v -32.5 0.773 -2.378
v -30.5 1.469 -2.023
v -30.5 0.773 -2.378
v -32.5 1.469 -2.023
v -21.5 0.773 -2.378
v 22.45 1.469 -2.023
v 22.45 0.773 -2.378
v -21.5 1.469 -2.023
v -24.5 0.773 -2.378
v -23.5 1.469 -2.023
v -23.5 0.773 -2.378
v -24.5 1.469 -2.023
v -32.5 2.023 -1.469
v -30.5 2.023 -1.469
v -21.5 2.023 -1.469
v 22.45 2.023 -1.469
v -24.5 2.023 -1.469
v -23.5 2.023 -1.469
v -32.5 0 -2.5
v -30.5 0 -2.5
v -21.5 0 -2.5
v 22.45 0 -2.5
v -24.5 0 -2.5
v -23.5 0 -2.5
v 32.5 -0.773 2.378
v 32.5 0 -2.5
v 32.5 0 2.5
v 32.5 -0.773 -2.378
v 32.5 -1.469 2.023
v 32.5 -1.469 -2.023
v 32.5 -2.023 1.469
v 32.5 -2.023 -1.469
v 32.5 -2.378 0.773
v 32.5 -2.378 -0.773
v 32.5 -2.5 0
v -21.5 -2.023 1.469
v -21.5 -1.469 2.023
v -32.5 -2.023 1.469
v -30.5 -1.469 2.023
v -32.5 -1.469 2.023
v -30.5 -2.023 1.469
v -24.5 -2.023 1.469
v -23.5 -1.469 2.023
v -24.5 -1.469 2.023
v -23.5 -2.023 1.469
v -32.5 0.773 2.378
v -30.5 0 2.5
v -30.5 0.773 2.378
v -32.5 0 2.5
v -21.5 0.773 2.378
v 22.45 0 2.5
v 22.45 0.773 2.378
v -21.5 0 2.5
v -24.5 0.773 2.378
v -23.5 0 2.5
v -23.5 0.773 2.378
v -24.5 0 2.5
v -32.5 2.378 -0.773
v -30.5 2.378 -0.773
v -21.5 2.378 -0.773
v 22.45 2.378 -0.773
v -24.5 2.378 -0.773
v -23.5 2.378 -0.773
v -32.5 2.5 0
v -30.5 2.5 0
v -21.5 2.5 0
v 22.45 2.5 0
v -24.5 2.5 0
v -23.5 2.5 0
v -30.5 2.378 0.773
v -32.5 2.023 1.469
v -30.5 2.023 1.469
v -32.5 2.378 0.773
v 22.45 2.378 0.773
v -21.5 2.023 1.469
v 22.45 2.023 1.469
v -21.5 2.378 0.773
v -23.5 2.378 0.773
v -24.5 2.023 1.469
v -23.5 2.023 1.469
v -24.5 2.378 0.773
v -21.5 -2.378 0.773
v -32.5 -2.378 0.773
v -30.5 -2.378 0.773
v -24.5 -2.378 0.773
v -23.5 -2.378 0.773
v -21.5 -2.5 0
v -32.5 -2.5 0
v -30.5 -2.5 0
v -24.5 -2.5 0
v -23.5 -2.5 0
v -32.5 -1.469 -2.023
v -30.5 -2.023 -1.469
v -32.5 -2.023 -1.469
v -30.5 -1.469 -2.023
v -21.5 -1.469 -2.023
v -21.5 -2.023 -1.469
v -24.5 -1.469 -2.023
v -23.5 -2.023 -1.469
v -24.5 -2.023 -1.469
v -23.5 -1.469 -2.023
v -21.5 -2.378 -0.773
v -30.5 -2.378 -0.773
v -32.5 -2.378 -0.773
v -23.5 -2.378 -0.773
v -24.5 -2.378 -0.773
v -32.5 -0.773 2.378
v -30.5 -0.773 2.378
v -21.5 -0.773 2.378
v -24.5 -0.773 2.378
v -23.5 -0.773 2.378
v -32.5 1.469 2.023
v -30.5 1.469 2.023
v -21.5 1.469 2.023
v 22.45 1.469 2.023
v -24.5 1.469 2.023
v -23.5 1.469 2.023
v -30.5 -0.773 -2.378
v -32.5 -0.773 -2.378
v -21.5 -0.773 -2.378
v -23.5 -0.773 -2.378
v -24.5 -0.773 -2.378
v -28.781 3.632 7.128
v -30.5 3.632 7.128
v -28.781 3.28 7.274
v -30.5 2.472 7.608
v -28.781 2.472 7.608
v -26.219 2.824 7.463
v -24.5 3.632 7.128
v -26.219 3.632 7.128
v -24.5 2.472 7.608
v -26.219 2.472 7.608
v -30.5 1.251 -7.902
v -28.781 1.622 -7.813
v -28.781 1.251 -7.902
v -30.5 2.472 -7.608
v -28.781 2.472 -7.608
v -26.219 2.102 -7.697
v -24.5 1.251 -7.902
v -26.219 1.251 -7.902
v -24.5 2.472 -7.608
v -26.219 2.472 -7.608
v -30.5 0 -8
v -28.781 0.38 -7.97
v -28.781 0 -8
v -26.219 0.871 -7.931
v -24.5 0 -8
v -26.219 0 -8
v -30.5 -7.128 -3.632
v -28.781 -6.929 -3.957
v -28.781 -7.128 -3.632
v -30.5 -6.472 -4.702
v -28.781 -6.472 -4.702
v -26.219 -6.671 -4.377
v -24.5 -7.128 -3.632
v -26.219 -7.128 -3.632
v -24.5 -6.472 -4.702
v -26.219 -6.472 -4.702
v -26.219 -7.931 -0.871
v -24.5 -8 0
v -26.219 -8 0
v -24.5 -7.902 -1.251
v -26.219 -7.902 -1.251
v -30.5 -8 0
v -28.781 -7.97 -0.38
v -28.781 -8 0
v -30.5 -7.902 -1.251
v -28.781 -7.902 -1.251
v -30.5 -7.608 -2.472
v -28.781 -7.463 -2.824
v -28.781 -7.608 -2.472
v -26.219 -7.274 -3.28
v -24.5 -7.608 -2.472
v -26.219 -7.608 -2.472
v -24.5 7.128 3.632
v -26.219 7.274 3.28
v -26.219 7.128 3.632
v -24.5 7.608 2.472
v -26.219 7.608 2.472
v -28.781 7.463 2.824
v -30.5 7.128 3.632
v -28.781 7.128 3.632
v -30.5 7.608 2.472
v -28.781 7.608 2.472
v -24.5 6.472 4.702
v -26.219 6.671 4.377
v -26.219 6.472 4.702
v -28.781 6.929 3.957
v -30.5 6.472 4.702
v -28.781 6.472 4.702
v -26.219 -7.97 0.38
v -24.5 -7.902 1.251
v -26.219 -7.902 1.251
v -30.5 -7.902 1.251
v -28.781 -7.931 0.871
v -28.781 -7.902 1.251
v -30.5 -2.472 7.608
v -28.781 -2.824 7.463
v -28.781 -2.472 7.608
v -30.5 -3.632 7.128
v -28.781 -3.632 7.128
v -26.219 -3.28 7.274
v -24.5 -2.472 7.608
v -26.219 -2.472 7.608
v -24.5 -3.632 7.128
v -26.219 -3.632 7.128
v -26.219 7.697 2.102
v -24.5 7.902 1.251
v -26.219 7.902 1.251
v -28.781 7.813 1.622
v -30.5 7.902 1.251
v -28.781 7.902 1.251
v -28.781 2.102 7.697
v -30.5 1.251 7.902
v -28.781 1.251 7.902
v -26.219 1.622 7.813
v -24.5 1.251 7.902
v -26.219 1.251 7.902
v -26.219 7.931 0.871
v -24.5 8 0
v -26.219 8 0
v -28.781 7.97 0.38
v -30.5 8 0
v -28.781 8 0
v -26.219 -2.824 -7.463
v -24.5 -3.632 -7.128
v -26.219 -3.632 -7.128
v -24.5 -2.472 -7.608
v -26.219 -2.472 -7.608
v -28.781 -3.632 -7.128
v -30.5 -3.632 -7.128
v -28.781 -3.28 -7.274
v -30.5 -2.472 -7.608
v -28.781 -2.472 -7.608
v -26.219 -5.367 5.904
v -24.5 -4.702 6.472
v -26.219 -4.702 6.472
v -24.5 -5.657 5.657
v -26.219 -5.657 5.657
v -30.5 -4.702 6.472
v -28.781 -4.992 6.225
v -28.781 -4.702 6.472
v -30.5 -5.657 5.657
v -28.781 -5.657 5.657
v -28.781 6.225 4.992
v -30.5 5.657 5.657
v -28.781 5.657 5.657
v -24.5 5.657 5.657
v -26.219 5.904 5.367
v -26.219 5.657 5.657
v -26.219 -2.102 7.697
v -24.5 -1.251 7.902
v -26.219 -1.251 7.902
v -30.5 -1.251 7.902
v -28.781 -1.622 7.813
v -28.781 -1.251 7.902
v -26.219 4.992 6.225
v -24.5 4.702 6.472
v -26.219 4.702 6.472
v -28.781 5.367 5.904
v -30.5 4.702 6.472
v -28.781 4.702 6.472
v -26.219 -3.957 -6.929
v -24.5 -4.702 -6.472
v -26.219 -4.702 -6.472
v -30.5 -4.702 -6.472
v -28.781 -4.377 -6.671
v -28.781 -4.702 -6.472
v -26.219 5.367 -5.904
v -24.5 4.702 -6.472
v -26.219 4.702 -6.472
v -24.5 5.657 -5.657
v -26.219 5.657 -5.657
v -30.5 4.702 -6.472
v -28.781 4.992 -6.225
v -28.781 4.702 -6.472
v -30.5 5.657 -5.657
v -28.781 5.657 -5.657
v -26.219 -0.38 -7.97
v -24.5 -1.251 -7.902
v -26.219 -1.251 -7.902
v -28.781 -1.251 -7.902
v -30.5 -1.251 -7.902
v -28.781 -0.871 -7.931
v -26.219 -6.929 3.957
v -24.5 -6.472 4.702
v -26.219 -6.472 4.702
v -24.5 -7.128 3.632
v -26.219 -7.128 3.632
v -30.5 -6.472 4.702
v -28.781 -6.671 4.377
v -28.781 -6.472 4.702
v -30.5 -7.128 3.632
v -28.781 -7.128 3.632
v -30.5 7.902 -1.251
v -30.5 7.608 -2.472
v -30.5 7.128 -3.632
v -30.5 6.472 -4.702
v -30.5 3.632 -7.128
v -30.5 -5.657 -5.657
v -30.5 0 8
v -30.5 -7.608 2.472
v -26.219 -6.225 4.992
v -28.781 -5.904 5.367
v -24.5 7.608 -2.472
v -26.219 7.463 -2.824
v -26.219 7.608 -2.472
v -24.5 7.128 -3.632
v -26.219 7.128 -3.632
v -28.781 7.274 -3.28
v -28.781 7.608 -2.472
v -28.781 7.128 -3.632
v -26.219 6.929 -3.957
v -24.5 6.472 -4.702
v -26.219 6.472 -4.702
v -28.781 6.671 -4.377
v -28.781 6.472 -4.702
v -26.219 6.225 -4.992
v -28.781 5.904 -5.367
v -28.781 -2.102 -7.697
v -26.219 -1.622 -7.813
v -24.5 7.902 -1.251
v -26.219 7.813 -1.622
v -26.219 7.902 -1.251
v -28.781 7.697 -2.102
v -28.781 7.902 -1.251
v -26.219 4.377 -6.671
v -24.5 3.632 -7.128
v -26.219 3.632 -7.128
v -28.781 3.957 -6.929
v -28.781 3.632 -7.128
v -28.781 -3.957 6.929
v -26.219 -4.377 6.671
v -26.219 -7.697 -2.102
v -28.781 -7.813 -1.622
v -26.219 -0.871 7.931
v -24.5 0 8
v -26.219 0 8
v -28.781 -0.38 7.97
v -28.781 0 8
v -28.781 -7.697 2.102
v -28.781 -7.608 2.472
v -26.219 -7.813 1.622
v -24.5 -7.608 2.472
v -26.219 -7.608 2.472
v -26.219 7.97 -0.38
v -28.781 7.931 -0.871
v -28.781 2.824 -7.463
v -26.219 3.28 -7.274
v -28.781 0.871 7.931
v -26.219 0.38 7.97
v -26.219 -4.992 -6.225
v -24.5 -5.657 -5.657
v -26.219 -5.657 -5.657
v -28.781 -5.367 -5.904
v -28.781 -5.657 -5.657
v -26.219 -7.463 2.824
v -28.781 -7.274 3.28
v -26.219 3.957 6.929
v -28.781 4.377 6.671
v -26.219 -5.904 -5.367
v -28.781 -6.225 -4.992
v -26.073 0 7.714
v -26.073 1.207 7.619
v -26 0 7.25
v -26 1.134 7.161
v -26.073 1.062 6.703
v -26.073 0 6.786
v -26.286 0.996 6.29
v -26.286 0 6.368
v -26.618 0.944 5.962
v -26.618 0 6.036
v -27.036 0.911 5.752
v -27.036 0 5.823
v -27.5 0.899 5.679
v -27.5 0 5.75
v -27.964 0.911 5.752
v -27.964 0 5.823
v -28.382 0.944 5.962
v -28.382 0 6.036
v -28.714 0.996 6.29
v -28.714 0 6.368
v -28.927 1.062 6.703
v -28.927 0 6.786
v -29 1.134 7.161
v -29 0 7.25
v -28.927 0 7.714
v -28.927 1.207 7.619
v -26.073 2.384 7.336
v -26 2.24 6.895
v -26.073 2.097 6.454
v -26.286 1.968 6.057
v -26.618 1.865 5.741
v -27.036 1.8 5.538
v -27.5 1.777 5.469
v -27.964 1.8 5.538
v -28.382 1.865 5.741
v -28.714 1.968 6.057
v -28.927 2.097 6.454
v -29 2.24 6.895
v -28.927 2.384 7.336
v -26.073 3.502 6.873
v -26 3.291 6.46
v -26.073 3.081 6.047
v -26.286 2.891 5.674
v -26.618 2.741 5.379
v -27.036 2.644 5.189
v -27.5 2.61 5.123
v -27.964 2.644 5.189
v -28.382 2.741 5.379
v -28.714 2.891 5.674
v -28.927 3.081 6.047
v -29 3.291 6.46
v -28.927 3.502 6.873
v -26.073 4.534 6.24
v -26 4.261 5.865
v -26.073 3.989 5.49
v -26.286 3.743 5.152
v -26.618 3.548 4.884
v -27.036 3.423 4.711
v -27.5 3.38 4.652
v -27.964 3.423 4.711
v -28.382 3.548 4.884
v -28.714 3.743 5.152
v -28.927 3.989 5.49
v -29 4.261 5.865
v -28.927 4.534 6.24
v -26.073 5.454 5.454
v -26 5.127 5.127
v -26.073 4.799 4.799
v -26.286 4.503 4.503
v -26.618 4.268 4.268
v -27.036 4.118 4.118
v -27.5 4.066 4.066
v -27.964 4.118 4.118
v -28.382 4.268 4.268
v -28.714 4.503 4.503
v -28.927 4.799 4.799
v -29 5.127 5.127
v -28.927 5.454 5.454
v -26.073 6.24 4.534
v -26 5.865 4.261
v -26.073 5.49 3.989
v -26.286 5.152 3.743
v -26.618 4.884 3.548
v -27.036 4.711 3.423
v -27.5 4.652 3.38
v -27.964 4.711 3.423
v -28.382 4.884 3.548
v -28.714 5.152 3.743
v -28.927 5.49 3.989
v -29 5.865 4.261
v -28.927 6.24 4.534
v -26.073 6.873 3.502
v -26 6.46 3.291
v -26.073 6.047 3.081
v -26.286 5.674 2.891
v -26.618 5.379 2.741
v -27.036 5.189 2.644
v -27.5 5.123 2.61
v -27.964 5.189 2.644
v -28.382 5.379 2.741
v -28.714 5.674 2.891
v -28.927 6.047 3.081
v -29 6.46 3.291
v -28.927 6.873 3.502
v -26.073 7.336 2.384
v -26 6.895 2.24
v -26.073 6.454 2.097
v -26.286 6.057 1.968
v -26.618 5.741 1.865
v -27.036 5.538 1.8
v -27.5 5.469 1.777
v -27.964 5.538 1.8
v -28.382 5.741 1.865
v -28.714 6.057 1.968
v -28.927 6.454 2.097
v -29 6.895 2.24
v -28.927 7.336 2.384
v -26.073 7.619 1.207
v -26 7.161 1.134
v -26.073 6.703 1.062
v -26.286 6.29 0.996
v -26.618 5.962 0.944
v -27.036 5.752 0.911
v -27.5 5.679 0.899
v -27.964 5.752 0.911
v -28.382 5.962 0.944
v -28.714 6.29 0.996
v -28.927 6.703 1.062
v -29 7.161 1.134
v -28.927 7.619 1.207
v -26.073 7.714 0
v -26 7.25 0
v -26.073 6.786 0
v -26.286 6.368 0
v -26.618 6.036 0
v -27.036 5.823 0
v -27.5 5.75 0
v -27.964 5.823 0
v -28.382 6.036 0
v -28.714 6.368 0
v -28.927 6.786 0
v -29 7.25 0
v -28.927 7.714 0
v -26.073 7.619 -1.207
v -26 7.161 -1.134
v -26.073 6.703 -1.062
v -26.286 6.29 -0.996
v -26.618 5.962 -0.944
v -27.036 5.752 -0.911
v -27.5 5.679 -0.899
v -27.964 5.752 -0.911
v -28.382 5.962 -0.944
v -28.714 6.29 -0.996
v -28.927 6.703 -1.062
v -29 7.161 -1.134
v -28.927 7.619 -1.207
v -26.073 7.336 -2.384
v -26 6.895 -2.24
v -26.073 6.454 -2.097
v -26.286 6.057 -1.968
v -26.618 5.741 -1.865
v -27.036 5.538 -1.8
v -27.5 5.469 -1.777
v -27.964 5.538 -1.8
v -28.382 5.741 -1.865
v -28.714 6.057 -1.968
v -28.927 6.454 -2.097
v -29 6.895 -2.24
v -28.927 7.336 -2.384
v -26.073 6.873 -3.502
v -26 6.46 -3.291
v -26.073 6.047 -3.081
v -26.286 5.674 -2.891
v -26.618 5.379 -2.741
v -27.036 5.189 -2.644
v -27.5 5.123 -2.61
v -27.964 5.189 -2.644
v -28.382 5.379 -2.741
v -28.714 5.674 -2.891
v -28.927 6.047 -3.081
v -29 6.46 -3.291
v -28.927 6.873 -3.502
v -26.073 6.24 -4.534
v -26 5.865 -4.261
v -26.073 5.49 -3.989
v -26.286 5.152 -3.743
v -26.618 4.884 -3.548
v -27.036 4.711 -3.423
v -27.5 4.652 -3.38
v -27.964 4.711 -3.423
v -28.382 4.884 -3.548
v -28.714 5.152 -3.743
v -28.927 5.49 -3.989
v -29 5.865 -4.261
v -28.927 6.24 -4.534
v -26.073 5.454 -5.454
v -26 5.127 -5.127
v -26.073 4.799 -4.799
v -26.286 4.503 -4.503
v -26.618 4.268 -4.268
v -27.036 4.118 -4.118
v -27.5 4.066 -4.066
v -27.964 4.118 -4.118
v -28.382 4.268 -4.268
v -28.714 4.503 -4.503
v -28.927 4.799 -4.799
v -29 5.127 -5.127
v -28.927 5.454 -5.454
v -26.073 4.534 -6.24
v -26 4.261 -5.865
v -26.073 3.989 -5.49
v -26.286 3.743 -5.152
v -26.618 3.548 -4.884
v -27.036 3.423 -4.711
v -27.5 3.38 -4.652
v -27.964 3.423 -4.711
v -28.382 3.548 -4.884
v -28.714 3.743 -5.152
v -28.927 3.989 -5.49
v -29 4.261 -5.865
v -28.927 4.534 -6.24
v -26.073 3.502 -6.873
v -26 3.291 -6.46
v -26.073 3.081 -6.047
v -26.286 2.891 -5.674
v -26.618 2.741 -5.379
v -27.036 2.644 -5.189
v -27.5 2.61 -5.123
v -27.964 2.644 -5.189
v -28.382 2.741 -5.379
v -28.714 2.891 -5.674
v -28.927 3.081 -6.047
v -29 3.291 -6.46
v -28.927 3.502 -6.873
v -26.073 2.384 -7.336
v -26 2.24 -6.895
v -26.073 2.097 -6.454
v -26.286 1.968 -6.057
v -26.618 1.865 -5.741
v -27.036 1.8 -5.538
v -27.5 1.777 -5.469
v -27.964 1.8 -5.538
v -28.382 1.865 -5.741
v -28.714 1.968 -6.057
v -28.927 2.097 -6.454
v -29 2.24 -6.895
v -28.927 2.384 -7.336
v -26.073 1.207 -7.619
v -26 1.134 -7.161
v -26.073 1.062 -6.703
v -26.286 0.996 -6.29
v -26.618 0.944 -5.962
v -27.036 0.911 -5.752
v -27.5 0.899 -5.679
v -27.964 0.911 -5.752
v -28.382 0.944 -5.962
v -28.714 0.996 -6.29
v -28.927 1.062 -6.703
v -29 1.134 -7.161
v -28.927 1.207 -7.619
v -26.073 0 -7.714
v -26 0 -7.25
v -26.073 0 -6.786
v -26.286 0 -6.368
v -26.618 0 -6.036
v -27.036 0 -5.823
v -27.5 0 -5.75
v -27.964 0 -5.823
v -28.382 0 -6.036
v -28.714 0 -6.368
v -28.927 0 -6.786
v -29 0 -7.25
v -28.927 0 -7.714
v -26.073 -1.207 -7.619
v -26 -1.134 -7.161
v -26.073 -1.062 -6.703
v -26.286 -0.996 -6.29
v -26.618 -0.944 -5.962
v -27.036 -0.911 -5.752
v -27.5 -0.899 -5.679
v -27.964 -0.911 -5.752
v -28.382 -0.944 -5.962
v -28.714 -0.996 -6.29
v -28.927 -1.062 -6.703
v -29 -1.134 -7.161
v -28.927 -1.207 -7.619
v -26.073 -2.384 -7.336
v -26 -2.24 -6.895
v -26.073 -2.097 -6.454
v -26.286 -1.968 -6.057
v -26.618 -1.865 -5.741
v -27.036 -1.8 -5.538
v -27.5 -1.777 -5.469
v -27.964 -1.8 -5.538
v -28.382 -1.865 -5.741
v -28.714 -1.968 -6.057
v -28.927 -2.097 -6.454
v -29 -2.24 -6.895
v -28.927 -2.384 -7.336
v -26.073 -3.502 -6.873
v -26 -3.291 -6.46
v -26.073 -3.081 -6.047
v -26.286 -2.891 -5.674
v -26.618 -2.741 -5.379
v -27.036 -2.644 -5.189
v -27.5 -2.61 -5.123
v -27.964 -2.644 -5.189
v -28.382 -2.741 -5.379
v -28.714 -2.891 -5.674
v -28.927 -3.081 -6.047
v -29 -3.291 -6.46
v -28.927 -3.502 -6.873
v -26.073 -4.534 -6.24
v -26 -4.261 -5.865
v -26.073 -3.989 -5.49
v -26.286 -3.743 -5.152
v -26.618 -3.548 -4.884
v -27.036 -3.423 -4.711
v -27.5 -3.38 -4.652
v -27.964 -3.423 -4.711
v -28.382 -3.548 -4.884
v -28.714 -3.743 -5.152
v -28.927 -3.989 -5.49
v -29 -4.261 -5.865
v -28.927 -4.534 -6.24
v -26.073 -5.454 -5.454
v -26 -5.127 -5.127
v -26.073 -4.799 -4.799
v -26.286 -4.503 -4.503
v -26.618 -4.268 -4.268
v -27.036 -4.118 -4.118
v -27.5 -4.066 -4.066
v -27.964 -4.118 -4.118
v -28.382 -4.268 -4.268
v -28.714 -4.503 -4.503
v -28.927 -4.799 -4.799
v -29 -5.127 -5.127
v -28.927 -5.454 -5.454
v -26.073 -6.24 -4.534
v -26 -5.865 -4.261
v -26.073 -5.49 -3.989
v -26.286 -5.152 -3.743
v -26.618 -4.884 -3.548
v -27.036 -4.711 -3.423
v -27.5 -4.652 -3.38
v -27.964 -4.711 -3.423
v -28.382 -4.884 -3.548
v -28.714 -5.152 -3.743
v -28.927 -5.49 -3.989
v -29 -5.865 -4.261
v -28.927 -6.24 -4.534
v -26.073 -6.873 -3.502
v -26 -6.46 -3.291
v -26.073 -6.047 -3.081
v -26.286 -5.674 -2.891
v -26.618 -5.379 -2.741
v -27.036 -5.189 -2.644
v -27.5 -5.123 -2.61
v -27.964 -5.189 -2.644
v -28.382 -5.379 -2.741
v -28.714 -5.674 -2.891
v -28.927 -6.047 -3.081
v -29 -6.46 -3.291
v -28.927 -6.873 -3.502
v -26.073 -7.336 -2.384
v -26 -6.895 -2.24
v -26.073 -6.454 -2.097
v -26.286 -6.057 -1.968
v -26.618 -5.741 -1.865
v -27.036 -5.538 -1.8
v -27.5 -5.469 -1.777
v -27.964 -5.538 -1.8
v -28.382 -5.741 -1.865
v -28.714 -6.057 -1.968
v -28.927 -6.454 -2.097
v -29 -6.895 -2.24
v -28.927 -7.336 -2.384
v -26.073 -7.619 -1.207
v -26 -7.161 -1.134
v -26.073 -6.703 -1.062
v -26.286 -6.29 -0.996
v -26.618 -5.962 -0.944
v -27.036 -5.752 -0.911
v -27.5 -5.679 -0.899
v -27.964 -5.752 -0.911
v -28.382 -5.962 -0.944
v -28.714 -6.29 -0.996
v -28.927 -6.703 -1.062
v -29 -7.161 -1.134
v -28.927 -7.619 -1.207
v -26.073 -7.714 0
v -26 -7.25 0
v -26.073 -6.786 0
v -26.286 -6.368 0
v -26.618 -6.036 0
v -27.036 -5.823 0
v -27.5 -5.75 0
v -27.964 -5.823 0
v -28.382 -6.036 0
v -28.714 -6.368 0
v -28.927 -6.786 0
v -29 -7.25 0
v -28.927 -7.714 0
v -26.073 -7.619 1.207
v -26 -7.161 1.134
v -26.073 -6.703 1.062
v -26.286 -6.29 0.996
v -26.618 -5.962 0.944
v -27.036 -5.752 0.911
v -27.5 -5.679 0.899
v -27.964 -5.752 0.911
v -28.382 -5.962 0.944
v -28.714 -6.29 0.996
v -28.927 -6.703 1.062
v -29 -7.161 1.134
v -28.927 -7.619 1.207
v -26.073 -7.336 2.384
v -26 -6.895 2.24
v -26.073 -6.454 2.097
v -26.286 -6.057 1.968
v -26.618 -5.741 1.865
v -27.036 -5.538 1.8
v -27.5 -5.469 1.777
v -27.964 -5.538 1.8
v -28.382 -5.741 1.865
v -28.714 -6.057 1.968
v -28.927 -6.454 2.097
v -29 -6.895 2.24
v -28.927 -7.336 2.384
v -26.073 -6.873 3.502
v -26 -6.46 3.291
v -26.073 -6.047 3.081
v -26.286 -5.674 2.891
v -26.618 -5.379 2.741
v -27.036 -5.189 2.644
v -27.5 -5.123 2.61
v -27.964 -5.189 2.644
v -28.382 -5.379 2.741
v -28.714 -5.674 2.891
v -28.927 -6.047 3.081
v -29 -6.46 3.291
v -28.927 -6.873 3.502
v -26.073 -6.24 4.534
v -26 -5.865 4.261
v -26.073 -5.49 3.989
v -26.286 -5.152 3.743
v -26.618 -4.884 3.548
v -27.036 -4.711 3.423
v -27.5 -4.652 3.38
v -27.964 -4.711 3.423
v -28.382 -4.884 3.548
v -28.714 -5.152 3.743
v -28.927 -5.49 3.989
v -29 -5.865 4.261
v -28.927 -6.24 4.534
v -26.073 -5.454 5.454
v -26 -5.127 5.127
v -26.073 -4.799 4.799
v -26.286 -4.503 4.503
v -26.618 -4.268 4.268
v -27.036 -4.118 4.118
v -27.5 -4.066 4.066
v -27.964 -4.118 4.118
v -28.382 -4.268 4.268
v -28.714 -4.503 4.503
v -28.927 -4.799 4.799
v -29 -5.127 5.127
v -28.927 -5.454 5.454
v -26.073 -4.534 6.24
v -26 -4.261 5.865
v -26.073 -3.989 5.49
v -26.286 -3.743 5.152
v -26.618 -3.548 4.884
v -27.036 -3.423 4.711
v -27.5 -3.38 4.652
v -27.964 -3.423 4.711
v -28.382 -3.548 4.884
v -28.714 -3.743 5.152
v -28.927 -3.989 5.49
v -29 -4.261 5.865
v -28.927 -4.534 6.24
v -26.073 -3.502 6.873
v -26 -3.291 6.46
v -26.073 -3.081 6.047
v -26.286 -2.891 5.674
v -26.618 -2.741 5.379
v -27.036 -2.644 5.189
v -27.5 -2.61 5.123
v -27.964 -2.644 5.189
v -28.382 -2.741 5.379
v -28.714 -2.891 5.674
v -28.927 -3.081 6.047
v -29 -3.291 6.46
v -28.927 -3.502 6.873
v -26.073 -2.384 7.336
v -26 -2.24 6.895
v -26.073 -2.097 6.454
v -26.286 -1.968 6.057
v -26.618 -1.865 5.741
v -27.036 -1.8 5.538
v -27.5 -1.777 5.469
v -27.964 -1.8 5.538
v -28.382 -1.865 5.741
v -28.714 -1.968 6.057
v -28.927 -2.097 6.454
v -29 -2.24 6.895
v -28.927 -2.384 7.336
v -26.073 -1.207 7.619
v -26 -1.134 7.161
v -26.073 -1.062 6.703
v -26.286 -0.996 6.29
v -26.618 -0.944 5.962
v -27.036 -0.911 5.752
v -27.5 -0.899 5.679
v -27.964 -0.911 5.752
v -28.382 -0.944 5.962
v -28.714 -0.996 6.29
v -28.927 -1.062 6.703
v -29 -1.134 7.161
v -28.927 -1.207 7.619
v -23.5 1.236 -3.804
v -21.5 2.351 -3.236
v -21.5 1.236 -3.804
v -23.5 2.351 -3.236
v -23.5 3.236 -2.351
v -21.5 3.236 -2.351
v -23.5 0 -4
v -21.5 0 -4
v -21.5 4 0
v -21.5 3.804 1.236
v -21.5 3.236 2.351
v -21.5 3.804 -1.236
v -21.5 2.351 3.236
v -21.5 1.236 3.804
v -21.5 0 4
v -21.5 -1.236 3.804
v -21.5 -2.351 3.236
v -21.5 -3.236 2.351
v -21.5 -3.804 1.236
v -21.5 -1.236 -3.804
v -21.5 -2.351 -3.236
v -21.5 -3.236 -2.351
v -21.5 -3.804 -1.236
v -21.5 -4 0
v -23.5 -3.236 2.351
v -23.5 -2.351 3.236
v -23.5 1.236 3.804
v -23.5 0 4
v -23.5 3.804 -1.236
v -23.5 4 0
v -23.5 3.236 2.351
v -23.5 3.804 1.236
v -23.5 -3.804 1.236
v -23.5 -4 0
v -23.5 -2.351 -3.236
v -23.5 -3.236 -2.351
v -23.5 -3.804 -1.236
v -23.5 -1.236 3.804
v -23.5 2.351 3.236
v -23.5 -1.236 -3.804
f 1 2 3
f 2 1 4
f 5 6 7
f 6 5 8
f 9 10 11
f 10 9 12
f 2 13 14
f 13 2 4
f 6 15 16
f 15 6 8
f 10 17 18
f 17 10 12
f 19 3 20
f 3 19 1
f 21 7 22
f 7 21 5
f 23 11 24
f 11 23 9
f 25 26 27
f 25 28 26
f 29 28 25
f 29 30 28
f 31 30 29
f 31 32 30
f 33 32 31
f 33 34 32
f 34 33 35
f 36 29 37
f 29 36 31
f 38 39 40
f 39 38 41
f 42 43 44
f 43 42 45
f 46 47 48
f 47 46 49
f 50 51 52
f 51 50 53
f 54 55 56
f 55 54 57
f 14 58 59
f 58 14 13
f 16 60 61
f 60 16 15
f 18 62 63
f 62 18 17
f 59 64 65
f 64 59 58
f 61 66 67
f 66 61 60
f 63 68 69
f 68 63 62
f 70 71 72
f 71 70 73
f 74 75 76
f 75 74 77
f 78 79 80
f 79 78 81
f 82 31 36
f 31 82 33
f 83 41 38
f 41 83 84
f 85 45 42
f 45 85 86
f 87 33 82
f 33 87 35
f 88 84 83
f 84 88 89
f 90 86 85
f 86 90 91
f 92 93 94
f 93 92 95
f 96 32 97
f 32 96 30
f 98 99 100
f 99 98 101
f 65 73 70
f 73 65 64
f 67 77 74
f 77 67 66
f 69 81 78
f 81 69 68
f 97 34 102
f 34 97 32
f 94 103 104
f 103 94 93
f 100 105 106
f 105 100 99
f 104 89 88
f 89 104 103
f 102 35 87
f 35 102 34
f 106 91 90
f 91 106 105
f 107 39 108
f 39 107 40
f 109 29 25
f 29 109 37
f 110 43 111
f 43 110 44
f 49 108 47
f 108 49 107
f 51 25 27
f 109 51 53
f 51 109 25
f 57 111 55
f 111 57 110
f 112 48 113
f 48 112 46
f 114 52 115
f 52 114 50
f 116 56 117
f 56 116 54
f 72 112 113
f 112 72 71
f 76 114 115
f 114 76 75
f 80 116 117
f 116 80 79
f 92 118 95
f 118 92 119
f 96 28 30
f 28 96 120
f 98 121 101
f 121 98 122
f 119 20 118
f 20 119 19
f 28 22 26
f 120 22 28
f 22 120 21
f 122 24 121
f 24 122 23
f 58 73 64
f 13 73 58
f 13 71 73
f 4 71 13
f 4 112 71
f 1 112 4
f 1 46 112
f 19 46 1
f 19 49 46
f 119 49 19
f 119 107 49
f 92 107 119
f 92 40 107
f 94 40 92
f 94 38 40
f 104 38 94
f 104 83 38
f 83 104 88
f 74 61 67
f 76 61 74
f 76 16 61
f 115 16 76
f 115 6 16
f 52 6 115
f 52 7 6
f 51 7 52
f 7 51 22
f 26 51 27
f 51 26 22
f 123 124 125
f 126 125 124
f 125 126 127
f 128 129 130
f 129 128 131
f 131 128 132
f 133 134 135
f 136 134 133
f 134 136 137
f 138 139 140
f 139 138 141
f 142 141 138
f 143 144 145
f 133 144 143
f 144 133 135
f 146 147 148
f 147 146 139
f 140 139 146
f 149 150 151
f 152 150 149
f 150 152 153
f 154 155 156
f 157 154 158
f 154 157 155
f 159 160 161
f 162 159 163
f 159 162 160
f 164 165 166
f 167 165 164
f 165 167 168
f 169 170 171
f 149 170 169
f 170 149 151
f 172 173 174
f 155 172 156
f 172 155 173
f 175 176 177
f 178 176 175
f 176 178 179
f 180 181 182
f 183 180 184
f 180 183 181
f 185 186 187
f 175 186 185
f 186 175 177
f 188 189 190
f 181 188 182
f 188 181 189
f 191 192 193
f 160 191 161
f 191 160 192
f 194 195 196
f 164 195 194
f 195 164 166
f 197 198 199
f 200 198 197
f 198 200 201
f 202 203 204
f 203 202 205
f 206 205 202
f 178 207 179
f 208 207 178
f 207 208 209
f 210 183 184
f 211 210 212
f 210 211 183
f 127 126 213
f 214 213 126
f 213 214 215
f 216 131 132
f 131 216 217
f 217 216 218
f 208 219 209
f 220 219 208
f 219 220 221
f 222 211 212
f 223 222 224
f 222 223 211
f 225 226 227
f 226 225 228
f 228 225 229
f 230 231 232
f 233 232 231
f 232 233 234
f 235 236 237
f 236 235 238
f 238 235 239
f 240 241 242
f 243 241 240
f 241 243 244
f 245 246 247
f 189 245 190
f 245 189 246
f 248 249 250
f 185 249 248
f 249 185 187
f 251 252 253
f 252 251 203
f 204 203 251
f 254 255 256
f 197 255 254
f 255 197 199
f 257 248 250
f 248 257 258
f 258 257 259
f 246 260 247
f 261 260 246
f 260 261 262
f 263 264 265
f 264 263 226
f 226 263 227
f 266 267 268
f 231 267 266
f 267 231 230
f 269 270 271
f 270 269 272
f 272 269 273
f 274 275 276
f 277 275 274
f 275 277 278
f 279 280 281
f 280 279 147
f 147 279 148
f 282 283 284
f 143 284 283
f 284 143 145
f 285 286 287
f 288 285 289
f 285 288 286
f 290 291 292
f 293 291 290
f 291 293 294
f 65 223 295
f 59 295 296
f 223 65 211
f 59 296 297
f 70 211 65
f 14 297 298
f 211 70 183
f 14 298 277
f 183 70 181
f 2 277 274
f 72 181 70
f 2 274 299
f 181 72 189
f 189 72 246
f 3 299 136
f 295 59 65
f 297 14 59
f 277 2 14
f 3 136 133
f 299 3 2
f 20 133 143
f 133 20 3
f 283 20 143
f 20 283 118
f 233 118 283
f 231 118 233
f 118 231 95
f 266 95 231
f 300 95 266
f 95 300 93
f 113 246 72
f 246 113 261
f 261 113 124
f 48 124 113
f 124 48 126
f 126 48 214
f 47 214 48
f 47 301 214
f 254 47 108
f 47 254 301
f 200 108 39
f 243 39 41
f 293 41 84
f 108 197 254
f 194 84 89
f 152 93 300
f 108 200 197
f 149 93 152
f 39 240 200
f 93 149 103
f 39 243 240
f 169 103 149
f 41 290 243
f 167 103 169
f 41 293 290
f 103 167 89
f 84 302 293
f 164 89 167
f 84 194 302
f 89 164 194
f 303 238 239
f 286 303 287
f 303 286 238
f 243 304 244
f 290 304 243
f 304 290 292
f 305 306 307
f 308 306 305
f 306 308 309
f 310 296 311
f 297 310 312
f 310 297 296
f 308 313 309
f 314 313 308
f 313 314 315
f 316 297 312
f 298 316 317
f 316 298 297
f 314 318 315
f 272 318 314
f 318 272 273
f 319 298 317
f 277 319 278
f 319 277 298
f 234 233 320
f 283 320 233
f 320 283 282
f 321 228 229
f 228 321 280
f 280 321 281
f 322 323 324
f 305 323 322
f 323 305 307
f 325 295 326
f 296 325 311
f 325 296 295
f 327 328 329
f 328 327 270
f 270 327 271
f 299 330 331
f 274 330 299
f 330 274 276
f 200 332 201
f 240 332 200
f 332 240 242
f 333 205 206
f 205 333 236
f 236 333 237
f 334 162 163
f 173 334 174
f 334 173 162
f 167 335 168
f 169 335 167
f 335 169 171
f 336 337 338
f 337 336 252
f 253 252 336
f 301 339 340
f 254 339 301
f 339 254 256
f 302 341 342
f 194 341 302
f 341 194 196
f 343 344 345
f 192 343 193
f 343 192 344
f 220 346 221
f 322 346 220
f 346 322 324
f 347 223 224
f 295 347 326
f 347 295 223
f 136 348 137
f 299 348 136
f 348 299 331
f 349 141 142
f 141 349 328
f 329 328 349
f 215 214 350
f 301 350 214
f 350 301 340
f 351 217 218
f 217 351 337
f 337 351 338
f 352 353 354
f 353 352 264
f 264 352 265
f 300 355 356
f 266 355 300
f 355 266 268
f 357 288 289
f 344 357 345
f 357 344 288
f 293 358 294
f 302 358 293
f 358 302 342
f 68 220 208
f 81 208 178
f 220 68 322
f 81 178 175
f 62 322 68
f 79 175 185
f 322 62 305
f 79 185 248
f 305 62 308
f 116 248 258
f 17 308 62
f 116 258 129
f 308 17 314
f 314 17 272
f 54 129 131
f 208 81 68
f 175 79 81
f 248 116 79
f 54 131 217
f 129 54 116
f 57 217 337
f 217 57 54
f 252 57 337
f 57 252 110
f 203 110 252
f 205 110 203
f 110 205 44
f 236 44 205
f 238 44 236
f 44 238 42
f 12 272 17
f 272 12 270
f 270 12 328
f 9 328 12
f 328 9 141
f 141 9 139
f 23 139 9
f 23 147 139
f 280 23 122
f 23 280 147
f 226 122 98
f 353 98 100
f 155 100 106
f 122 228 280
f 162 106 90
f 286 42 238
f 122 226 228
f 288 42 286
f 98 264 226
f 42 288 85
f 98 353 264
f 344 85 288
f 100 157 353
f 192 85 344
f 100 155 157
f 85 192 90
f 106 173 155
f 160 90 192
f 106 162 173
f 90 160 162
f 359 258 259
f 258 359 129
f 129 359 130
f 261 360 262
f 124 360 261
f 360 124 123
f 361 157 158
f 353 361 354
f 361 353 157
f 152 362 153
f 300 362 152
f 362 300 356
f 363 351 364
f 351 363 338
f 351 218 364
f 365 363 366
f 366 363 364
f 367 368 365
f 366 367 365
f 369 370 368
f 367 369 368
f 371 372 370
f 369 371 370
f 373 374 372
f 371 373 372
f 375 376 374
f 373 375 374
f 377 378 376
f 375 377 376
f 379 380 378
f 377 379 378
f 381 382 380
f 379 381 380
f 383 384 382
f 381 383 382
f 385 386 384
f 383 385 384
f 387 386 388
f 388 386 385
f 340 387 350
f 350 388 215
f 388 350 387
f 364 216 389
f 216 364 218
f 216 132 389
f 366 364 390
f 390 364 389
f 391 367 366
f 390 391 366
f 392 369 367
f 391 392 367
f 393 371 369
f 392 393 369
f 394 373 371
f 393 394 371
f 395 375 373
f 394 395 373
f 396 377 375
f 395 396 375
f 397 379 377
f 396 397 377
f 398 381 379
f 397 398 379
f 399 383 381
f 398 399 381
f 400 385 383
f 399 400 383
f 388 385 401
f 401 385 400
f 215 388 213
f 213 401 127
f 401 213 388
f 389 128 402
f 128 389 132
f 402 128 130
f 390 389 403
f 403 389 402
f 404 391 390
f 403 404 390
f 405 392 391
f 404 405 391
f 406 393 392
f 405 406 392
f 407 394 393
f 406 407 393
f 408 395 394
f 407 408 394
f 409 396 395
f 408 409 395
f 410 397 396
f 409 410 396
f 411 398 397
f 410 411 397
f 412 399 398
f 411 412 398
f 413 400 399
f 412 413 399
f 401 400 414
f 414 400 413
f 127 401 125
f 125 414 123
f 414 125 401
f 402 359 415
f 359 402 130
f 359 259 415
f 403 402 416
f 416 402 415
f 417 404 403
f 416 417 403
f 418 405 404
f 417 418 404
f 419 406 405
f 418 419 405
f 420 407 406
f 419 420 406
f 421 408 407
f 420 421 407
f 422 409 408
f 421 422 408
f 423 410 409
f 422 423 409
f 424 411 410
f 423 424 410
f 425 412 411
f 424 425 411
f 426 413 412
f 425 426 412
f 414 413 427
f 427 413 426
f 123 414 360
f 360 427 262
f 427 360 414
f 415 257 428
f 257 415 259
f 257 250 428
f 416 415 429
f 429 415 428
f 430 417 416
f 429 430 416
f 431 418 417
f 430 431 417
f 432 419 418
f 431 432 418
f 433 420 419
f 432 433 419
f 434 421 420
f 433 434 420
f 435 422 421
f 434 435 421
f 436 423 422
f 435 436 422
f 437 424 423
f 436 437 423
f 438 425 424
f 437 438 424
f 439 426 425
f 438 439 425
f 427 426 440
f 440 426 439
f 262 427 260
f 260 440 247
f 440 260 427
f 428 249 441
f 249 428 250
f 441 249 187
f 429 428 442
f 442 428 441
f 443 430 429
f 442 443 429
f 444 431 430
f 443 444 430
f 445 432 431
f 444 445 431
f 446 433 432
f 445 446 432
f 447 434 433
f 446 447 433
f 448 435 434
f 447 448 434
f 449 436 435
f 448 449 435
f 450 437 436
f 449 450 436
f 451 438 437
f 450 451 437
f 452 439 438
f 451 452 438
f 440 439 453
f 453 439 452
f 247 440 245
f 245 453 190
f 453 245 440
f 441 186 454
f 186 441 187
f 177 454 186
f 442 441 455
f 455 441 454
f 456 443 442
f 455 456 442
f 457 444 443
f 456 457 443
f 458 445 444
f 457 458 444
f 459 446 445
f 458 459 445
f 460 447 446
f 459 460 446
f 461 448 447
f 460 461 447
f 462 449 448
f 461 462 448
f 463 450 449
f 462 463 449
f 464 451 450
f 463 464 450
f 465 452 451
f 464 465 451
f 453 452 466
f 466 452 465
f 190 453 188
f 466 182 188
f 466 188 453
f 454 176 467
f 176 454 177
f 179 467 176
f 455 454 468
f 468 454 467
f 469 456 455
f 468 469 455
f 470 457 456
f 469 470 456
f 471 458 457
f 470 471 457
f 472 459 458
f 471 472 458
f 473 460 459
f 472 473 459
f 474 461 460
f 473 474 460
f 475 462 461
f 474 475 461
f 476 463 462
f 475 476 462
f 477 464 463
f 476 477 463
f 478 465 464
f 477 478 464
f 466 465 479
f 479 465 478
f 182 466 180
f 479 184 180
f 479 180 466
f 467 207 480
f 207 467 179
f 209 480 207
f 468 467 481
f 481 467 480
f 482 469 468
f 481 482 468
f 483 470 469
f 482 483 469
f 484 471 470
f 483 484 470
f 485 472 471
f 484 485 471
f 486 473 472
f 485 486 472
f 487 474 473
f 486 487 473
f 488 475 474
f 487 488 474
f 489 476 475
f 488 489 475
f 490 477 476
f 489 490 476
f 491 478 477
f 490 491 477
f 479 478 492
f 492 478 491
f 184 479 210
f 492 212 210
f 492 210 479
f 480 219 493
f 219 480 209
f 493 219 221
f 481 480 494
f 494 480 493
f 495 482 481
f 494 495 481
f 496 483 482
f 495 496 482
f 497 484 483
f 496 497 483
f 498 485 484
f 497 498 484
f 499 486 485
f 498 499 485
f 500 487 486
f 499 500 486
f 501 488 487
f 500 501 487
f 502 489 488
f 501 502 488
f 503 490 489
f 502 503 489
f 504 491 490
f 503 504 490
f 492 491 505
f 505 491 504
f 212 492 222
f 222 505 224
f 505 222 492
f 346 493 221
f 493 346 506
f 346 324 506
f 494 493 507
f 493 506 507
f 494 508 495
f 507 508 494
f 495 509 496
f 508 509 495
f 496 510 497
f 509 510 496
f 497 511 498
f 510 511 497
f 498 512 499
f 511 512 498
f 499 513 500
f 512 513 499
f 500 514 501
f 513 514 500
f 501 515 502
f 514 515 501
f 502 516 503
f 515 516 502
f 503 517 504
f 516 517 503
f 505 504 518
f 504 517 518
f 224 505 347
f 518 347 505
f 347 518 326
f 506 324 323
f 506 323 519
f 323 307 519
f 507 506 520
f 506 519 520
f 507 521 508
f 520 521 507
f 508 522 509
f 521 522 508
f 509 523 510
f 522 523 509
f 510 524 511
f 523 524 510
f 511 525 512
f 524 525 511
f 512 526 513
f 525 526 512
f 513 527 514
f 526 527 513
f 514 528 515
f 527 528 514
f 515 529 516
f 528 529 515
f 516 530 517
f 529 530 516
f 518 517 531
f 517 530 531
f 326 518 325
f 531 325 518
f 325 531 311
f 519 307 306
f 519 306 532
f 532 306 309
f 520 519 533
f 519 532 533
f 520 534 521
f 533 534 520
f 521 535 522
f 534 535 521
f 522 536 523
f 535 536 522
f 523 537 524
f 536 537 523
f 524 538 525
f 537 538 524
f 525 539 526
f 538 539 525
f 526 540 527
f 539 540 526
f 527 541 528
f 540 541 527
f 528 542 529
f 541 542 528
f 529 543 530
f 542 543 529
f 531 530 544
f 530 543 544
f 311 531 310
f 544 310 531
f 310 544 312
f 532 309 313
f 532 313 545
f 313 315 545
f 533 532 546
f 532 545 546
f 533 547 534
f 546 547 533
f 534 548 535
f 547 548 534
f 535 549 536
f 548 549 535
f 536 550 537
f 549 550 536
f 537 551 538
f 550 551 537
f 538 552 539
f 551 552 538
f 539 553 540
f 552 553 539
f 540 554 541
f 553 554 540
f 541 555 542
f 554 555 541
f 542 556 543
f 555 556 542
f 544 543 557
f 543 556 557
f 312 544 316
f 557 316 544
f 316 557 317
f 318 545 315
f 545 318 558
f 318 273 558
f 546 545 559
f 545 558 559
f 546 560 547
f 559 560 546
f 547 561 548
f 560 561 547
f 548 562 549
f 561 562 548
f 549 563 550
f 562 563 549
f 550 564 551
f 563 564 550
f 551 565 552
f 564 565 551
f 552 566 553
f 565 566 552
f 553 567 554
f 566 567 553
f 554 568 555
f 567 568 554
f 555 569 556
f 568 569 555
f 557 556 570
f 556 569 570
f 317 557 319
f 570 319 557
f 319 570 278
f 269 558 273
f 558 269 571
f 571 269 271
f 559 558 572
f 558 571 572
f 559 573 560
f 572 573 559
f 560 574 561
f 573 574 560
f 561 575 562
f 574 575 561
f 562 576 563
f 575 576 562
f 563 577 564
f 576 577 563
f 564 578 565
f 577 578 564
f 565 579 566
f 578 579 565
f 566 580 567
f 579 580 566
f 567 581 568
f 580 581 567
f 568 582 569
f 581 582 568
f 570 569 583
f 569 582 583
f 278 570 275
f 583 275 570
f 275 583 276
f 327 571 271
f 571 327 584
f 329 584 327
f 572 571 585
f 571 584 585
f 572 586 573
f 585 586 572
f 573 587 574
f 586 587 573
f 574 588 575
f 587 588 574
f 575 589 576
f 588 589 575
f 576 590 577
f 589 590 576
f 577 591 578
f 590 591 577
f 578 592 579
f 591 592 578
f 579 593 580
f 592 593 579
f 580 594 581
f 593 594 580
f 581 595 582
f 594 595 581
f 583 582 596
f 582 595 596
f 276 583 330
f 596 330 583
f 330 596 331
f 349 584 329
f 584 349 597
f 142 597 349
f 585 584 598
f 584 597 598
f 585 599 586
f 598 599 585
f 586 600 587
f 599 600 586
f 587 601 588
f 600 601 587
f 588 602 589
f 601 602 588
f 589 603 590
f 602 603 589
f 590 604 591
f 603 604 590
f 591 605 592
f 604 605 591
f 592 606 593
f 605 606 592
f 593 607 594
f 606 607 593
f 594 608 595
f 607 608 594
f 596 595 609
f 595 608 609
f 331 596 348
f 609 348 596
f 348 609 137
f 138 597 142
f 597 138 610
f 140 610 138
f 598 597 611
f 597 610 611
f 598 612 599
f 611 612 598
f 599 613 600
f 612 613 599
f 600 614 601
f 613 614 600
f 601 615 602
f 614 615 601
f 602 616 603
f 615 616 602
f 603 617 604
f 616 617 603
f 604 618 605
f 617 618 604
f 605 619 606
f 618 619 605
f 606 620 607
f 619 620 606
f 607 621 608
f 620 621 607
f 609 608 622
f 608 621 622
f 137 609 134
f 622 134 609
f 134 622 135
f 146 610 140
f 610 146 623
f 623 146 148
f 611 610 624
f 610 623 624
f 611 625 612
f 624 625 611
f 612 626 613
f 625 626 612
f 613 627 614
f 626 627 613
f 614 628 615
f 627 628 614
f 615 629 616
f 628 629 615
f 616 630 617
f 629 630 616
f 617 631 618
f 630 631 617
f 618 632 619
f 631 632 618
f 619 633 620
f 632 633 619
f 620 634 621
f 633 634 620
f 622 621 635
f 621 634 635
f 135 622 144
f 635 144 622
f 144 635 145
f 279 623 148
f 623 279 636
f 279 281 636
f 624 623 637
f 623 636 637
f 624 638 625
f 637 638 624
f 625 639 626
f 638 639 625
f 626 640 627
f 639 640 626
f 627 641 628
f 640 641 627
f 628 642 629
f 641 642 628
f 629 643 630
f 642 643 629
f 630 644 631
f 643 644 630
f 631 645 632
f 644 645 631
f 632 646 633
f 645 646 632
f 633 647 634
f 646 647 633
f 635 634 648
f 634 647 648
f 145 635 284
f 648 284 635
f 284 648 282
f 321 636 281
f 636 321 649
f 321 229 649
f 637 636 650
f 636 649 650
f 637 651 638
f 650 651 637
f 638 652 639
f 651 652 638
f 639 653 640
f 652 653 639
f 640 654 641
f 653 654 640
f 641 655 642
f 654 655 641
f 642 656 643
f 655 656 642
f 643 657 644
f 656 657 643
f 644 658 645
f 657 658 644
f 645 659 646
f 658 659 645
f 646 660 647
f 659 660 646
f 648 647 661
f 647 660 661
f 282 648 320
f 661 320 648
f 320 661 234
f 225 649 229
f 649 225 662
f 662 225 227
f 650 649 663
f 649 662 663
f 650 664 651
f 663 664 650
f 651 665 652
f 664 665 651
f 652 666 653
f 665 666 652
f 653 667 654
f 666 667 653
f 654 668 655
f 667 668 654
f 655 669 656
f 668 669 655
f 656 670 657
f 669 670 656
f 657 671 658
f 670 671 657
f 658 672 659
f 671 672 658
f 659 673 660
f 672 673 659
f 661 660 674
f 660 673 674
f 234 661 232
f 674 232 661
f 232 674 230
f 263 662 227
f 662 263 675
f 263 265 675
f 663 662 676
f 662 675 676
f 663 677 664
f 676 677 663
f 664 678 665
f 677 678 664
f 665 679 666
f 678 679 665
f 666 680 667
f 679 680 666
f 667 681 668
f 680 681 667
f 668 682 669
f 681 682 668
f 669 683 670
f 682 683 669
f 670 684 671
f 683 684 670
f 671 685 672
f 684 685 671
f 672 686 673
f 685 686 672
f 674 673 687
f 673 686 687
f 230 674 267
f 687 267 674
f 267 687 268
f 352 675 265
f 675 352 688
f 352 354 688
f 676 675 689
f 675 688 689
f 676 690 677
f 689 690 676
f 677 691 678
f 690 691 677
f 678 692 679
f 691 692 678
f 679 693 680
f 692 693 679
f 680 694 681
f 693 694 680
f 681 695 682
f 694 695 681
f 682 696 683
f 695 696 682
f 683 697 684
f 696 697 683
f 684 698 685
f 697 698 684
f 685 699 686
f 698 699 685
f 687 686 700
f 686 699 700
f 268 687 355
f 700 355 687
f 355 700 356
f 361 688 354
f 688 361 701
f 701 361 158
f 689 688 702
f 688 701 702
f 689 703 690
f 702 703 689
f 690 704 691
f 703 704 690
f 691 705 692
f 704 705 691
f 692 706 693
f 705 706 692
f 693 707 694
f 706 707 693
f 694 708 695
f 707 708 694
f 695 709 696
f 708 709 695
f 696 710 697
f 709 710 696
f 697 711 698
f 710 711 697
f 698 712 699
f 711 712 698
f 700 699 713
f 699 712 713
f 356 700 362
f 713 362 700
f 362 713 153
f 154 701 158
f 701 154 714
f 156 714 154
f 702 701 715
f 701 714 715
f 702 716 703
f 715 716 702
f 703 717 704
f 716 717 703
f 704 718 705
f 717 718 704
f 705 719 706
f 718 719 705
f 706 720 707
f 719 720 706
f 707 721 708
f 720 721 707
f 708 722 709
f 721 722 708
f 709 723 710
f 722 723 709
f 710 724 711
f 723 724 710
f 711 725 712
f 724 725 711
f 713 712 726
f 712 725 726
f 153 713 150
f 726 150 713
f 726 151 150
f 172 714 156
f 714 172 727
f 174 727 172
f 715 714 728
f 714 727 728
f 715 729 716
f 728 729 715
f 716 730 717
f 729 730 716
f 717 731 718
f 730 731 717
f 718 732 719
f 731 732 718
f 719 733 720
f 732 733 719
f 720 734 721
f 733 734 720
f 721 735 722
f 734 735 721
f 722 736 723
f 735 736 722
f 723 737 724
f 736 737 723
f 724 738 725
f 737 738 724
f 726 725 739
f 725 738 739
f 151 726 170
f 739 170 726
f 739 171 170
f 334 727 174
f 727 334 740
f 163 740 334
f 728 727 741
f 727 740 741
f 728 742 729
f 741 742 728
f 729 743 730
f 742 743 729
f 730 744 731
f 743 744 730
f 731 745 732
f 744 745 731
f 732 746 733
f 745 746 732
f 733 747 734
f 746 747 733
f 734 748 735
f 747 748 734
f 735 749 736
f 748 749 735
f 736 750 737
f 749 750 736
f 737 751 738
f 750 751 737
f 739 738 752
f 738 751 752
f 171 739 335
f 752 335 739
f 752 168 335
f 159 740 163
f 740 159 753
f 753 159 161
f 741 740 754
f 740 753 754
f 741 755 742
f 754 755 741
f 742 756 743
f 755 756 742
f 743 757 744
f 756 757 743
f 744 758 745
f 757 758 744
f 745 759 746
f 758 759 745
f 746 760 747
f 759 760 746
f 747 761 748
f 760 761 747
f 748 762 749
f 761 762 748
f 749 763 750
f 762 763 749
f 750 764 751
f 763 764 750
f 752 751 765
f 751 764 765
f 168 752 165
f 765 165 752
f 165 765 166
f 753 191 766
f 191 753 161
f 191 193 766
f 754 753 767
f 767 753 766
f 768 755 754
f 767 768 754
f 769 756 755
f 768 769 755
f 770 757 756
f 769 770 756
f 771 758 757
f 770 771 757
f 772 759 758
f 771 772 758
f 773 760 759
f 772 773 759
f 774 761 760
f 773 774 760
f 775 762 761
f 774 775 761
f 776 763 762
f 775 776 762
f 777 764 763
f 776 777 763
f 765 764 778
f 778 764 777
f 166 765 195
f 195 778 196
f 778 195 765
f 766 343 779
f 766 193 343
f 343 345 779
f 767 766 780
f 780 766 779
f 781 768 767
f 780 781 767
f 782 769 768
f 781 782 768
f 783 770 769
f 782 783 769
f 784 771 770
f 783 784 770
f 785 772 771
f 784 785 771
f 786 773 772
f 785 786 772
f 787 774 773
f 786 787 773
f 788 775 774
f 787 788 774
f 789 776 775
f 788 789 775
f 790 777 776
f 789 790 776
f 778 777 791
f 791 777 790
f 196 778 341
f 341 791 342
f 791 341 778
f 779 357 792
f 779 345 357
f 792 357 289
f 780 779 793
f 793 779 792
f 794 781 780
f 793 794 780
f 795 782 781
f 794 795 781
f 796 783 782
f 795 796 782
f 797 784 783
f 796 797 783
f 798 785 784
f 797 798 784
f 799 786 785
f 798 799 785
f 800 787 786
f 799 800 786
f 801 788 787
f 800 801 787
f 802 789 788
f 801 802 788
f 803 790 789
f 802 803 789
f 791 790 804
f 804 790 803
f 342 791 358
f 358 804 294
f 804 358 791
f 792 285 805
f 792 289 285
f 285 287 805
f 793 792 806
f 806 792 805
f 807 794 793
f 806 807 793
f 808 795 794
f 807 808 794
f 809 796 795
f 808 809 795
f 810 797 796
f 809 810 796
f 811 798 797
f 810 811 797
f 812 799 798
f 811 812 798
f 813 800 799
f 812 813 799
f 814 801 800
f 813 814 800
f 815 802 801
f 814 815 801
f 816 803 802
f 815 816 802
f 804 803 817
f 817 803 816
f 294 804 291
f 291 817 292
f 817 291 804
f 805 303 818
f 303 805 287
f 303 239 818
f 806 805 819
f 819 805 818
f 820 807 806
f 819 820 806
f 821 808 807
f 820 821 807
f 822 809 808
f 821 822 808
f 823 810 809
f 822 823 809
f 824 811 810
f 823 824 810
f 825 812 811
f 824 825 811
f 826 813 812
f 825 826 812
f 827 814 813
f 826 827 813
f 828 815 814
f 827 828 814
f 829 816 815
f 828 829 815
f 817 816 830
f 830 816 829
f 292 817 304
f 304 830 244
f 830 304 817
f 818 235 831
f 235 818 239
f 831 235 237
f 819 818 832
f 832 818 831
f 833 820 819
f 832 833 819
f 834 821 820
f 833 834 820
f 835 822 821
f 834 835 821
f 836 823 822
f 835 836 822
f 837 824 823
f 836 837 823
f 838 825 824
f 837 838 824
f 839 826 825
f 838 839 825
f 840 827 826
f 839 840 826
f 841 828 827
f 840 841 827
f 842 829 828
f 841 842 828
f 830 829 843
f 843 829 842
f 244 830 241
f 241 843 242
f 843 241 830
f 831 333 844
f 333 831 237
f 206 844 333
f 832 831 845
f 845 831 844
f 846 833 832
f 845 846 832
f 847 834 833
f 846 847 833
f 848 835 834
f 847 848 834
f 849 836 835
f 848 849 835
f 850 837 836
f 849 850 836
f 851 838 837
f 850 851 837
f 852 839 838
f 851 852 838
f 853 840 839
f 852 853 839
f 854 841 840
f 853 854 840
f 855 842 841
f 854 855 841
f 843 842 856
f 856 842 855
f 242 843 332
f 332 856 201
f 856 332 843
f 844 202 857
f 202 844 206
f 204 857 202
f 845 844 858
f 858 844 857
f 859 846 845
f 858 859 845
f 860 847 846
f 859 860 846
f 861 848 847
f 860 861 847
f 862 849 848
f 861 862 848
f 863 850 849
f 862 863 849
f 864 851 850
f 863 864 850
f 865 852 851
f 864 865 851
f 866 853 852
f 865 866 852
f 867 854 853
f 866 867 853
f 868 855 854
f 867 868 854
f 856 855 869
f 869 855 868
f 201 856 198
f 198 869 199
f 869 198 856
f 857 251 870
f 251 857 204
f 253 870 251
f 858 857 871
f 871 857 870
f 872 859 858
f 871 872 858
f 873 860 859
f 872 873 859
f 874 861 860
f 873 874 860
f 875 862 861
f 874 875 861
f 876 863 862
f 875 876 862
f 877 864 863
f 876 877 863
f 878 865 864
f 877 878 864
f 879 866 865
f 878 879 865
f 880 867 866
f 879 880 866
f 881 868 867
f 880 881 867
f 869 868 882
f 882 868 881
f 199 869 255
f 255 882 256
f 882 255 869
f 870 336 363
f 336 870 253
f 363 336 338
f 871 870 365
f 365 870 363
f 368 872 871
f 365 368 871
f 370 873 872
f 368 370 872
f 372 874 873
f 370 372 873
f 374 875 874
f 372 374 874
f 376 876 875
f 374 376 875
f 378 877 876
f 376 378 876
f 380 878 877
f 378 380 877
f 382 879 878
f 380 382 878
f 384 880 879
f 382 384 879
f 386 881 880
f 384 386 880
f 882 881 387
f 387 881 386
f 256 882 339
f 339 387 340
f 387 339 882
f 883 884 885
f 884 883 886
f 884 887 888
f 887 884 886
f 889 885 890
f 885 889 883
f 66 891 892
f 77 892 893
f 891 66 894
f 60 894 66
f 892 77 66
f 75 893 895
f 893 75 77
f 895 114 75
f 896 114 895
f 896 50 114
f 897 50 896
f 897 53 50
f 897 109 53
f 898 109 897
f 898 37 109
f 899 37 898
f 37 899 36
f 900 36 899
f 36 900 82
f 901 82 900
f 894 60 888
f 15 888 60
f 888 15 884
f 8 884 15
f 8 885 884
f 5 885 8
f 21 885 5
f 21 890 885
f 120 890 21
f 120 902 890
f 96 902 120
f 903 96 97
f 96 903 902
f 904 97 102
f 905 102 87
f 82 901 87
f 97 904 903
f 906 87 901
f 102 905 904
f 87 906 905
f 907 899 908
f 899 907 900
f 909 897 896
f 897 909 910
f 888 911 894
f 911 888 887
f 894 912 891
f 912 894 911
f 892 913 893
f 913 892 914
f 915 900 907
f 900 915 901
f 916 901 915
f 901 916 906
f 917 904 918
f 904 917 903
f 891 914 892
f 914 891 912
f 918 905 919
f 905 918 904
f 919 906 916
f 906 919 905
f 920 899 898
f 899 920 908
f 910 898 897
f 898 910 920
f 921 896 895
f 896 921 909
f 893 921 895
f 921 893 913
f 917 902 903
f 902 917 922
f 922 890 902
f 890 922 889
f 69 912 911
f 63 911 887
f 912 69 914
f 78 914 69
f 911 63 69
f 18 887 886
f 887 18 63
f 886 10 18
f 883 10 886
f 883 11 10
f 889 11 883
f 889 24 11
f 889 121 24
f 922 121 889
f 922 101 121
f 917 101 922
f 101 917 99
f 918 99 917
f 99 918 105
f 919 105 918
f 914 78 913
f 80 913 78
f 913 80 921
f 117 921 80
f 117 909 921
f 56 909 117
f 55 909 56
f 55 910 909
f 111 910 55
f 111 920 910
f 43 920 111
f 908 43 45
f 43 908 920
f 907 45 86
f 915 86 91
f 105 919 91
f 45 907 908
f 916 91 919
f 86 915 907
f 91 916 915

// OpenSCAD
// file: fan.scad
// Steam Engine Fan - Three Piece Design
// Piece 1: Base with U-cradle bearings (prints flat, no supports)
// Piece 2: Axle with pulley only (prints on side, minimal supports)
// Piece 3: Fan disc with D-hole hub (prints flat, no supports)

// === Parameters ===
fan_blades = 6;
fan_radius = 25;
fan_hub_radius = 6;
fan_blade_width = 8;
fan_blade_thickness = 2;
fan_blade_angle = 25;

pulley_radius = 8;
pulley_width = 6;
pulley_groove_depth = 1.5;

axle_radius = 2.5;
axle_length = 65;
d_flat_depth = 1;  // how much to cut for D-shape

base_length = 50;
base_width = 30;
base_height = 3;
base_screw_hole_radius = 1.5;
base_screw_inset = 5;

bearing_height = 35;
bearing_wall = 3;
bearing_width = 8;
clearance = 0.15;  // tight fit for open slot

// === D-shape profiles ===
module d_shaft(length) {
    // Axle with a flat cut on one side
    difference() {
        rotate([0, 90, 0])
            cylinder(h=length, r=axle_radius, center=true, $fn=20);
        // Cut flat
        translate([0, axle_radius - d_flat_depth + axle_radius, 0])
            cube([length + 1, axle_radius * 2, axle_radius * 2], center=true);
    }
}

module d_hole(depth) {
    // Matching D-shaped hole with clearance
    hole_r = axle_radius + 0.2;
    difference() {
        rotate([0, 90, 0])
            cylinder(h=depth + 1, r=hole_r, center=true, $fn=20);
        translate([0, hole_r - d_flat_depth + hole_r, 0])
            cube([depth + 2, hole_r * 2, hole_r * 2], center=true);
    }
}

// === Piece 1: Base with U-Cradle Bearings ===

module base() {
    difference() {
        cube([base_length, base_width, base_height], center=true);
        for (x = [-base_length/2 + base_screw_inset, base_length/2 - base_screw_inset])
            for (y = [-base_width/2 + base_screw_inset, base_width/2 - base_screw_inset])
                translate([x, y, 0])
                    cylinder(h=base_height+1, r=base_screw_hole_radius, center=true, $fn=20);
    }
}

module cradle_bearing() {
    cradle_r_inner = axle_radius + clearance;
    cradle_r_outer = cradle_r_inner + bearing_wall;
    post_width = bearing_width;
    post_depth = cradle_r_outer * 2;
    slot_width = (axle_radius + clearance) * 2;  // width of slot for axle
    slot_depth = bearing_height - 25;  // slot bottom at 25mm above base floor

    // Simple rectangular post with vertical slot from top
    difference() {
        // Solid post
        translate([-post_width/2, -post_depth/2, base_height/2])
            cube([post_width, post_depth, bearing_height - base_height/2]);
        // Vertical slot cut from top
        translate([-post_width/2 - 0.5, -slot_width/2, bearing_height - slot_depth])
            cube([post_width + 1, slot_width, slot_depth + 1]);
    }
}

module piece1_base() {
    translate([0, 0, base_height/2])
        base();
    pulley_bearing_x = -base_length/2 + bearing_width/2 + 2;
    fan_bearing_x = base_length/2 - bearing_width/2 - 2;
    translate([pulley_bearing_x, 0, 0])
        cradle_bearing();
    translate([fan_bearing_x, 0, 0])
        cradle_bearing();
}

// === Piece 2: Axle + Pulley (no fan) ===

module pulley() {
    rotate([0, 90, 0])
        difference() {
            cylinder(h=pulley_width, r=pulley_radius, center=true, $fn=40);
            rotate_extrude($fn=40)
                translate([pulley_radius - pulley_groove_depth/2, 0, 0])
                    circle(r=pulley_groove_depth, $fn=20);
        }
}

module piece2_axle() {
    // Axle with D-flat on fan end
    difference() {
        rotate([0, 90, 0])
            cylinder(h=axle_length, r=axle_radius, center=true, $fn=20);
        // D-flat cut on fan end (last 10mm)
        translate([axle_length/2 - 5, axle_radius, 0])
            cube([10.1, axle_radius * 2, axle_radius * 2], center=true);
    }
    // Pulley near one end
    translate([-axle_length/2 + pulley_width/2 + 2, 0, 0])
        pulley();
    // Retaining collar next to pulley
    translate([-axle_length/2 + pulley_width + 4, 0, 0])
        rotate([0, 90, 0])
            cylinder(h=2, r=axle_radius + 1.5, center=true, $fn=20);
}

// === Piece 3: Fan Disc ===

blade_sweep = 30;  // degrees of curve across blade length

module swept_blade() {
    blade_length = fan_radius - fan_hub_radius + 1;
    steps = 8;
    step_len = blade_length / steps;
    step_angle = blade_sweep / steps;

    for (s = [0:steps-1]) {
        rotate([0, 0, s * step_angle])
            translate([fan_hub_radius - 1 + s * step_len, -fan_blade_thickness/2, 0])
                cube([step_len + 0.1, fan_blade_thickness, fan_blade_width]);
    }
}

module piece3_fan() {
    difference() {
        union() {
            // Hub
            cylinder(h=fan_blade_width, r=fan_hub_radius, $fn=30);
            // Swept blades
            for (i = [0:fan_blades-1]) {
                rotate([0, 0, i * (360/fan_blades)])
                    swept_blade();
            }
        }
        // D-shaped hole through hub (along Z)
        translate([0, 0, -0.5]) {
            hole_r = axle_radius + 0.2;
            difference() {
                cylinder(h=fan_blade_width + 1, r=hole_r, $fn=20);
                translate([0, hole_r - d_flat_depth + hole_r, 0])
                    cube([hole_r * 2 + 1, hole_r * 2, fan_blade_width + 2], center=true);
            }
        }
    }
}

// === Render all pieces for preview ===
piece1_base();

translate([0, 0, bearing_height + 15])
    piece2_axle();

translate([0, 50, fan_radius + 5])
    piece3_fan();
// main file
// Piece 2: Axle + Pulley (no fan blades)
// Print on its side, minimal supports needed
use <fan.scad>
piece2_axle();
